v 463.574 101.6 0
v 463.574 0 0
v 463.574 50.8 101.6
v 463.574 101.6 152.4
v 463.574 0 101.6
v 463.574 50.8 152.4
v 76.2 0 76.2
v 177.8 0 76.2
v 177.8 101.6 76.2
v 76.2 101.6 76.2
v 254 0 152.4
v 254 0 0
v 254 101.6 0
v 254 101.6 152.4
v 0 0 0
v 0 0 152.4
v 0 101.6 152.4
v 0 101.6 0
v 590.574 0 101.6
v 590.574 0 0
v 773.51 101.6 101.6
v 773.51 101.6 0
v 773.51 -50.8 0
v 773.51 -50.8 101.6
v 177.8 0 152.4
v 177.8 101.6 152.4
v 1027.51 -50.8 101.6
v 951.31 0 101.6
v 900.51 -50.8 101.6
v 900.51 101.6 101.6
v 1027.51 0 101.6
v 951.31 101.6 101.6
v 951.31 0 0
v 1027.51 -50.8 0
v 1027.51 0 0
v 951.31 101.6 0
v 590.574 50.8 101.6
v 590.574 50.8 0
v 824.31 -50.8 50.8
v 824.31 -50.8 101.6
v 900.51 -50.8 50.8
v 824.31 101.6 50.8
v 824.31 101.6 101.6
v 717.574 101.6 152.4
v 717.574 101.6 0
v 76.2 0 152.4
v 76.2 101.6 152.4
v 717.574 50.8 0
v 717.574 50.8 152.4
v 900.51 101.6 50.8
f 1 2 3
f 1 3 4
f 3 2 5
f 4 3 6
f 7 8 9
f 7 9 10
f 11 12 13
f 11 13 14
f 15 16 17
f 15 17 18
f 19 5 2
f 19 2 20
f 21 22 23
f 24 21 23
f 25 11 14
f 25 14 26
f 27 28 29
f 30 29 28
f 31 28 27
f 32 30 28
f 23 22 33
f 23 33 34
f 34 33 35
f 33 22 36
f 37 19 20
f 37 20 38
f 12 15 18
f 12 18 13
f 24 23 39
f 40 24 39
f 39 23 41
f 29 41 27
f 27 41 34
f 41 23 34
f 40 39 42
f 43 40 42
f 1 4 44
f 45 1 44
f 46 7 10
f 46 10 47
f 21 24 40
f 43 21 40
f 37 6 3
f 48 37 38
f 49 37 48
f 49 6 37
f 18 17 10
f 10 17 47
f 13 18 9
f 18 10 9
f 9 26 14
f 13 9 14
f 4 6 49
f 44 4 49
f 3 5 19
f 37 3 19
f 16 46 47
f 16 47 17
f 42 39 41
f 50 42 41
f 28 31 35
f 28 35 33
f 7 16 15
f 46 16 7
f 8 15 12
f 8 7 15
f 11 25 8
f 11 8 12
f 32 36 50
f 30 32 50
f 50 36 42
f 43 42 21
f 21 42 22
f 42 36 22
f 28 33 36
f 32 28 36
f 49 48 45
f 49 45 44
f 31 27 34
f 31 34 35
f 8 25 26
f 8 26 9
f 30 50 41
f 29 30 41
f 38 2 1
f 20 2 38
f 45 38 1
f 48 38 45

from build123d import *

# Parameters (mm, degrees)
F1_DEPTH  = 101.6
F2_W      = 254
F2_H      = 152.4
F3_DEPTH  = 101.6
F4_W      = 127
F4_H      = 50.8
F5_DEPTH  = 152.4
F6_W      = 127
F6_H      = 50.8
F7_DEPTH  = 50.8
F10_DEPTH = 101.6
F11_DEPTH = 50.8
F12_DEPTH = 101.6


with BuildPart() as f1:
    # F0 (on Front) → F1 (new body)
    with BuildSketch(Plane.XZ):
        Polygon((0, 152.4), (0, 0), (254, 0), (254, 152.4), (177.8, 152.4), (177.8, 76.2), (76.2, 76.2), (76.2, 152.4), align=None)
    extrude(amount=-F1_DEPTH)


with BuildPart() as f3:
    # F2 (on Front) → F3 (new body)
    with BuildSketch(Plane.XZ):
        with Locations((590.574124, 76.2)):
            Rectangle(F2_W, F2_H)
    extrude(amount=-F3_DEPTH)

    # F4 (on face) → F5 (cut)
    with BuildSketch(Plane.XY.offset(152.4)):
        with Locations((654.074124, 25.4)):
            Rectangle(F4_W, F4_H)
    extrude(amount=-F5_DEPTH, mode=Mode.SUBTRACT)

    # F6 (on face) → F7 (cut)
    with BuildSketch(Plane.XZ):
        with Locations((527.074124, 127)):
            Rectangle(F6_W, F6_H)
    extrude(amount=-F7_DEPTH, mode=Mode.SUBTRACT)


with BuildPart() as f10:
    # F9 (on Top) → F10 (new body)
    with BuildSketch(Plane.XY):
        Polygon((951.310462, 101.6), (900.510462, 101.6), (900.510462, 0), (900.510462, -50.8), (1027.510462, -50.8), (1027.510462, 0), (951.310462, 0), align=None)
    extrude(amount=F10_DEPTH)

    # F9 (on Top) → F11 (join)
    with BuildSketch(Plane.XY):
        Polygon((900.510462, 101.6), (824.310462, 101.6), (824.310462, 0), (824.310462, -50.8), (900.510462, -50.8), (900.510462, 0), align=None)
    extrude(amount=F11_DEPTH)

    # F9 (on Top) → F12 (join)
    with BuildSketch(Plane.XY):
        Polygon((773.510462, 101.6), (773.510462, 0), (773.510462, -50.8), (824.310462, -50.8), (824.310462, 0), (824.310462, 101.6), align=None)
    extrude(amount=F12_DEPTH)


solid = Compound([f1.part, f3.part, f10.part])
